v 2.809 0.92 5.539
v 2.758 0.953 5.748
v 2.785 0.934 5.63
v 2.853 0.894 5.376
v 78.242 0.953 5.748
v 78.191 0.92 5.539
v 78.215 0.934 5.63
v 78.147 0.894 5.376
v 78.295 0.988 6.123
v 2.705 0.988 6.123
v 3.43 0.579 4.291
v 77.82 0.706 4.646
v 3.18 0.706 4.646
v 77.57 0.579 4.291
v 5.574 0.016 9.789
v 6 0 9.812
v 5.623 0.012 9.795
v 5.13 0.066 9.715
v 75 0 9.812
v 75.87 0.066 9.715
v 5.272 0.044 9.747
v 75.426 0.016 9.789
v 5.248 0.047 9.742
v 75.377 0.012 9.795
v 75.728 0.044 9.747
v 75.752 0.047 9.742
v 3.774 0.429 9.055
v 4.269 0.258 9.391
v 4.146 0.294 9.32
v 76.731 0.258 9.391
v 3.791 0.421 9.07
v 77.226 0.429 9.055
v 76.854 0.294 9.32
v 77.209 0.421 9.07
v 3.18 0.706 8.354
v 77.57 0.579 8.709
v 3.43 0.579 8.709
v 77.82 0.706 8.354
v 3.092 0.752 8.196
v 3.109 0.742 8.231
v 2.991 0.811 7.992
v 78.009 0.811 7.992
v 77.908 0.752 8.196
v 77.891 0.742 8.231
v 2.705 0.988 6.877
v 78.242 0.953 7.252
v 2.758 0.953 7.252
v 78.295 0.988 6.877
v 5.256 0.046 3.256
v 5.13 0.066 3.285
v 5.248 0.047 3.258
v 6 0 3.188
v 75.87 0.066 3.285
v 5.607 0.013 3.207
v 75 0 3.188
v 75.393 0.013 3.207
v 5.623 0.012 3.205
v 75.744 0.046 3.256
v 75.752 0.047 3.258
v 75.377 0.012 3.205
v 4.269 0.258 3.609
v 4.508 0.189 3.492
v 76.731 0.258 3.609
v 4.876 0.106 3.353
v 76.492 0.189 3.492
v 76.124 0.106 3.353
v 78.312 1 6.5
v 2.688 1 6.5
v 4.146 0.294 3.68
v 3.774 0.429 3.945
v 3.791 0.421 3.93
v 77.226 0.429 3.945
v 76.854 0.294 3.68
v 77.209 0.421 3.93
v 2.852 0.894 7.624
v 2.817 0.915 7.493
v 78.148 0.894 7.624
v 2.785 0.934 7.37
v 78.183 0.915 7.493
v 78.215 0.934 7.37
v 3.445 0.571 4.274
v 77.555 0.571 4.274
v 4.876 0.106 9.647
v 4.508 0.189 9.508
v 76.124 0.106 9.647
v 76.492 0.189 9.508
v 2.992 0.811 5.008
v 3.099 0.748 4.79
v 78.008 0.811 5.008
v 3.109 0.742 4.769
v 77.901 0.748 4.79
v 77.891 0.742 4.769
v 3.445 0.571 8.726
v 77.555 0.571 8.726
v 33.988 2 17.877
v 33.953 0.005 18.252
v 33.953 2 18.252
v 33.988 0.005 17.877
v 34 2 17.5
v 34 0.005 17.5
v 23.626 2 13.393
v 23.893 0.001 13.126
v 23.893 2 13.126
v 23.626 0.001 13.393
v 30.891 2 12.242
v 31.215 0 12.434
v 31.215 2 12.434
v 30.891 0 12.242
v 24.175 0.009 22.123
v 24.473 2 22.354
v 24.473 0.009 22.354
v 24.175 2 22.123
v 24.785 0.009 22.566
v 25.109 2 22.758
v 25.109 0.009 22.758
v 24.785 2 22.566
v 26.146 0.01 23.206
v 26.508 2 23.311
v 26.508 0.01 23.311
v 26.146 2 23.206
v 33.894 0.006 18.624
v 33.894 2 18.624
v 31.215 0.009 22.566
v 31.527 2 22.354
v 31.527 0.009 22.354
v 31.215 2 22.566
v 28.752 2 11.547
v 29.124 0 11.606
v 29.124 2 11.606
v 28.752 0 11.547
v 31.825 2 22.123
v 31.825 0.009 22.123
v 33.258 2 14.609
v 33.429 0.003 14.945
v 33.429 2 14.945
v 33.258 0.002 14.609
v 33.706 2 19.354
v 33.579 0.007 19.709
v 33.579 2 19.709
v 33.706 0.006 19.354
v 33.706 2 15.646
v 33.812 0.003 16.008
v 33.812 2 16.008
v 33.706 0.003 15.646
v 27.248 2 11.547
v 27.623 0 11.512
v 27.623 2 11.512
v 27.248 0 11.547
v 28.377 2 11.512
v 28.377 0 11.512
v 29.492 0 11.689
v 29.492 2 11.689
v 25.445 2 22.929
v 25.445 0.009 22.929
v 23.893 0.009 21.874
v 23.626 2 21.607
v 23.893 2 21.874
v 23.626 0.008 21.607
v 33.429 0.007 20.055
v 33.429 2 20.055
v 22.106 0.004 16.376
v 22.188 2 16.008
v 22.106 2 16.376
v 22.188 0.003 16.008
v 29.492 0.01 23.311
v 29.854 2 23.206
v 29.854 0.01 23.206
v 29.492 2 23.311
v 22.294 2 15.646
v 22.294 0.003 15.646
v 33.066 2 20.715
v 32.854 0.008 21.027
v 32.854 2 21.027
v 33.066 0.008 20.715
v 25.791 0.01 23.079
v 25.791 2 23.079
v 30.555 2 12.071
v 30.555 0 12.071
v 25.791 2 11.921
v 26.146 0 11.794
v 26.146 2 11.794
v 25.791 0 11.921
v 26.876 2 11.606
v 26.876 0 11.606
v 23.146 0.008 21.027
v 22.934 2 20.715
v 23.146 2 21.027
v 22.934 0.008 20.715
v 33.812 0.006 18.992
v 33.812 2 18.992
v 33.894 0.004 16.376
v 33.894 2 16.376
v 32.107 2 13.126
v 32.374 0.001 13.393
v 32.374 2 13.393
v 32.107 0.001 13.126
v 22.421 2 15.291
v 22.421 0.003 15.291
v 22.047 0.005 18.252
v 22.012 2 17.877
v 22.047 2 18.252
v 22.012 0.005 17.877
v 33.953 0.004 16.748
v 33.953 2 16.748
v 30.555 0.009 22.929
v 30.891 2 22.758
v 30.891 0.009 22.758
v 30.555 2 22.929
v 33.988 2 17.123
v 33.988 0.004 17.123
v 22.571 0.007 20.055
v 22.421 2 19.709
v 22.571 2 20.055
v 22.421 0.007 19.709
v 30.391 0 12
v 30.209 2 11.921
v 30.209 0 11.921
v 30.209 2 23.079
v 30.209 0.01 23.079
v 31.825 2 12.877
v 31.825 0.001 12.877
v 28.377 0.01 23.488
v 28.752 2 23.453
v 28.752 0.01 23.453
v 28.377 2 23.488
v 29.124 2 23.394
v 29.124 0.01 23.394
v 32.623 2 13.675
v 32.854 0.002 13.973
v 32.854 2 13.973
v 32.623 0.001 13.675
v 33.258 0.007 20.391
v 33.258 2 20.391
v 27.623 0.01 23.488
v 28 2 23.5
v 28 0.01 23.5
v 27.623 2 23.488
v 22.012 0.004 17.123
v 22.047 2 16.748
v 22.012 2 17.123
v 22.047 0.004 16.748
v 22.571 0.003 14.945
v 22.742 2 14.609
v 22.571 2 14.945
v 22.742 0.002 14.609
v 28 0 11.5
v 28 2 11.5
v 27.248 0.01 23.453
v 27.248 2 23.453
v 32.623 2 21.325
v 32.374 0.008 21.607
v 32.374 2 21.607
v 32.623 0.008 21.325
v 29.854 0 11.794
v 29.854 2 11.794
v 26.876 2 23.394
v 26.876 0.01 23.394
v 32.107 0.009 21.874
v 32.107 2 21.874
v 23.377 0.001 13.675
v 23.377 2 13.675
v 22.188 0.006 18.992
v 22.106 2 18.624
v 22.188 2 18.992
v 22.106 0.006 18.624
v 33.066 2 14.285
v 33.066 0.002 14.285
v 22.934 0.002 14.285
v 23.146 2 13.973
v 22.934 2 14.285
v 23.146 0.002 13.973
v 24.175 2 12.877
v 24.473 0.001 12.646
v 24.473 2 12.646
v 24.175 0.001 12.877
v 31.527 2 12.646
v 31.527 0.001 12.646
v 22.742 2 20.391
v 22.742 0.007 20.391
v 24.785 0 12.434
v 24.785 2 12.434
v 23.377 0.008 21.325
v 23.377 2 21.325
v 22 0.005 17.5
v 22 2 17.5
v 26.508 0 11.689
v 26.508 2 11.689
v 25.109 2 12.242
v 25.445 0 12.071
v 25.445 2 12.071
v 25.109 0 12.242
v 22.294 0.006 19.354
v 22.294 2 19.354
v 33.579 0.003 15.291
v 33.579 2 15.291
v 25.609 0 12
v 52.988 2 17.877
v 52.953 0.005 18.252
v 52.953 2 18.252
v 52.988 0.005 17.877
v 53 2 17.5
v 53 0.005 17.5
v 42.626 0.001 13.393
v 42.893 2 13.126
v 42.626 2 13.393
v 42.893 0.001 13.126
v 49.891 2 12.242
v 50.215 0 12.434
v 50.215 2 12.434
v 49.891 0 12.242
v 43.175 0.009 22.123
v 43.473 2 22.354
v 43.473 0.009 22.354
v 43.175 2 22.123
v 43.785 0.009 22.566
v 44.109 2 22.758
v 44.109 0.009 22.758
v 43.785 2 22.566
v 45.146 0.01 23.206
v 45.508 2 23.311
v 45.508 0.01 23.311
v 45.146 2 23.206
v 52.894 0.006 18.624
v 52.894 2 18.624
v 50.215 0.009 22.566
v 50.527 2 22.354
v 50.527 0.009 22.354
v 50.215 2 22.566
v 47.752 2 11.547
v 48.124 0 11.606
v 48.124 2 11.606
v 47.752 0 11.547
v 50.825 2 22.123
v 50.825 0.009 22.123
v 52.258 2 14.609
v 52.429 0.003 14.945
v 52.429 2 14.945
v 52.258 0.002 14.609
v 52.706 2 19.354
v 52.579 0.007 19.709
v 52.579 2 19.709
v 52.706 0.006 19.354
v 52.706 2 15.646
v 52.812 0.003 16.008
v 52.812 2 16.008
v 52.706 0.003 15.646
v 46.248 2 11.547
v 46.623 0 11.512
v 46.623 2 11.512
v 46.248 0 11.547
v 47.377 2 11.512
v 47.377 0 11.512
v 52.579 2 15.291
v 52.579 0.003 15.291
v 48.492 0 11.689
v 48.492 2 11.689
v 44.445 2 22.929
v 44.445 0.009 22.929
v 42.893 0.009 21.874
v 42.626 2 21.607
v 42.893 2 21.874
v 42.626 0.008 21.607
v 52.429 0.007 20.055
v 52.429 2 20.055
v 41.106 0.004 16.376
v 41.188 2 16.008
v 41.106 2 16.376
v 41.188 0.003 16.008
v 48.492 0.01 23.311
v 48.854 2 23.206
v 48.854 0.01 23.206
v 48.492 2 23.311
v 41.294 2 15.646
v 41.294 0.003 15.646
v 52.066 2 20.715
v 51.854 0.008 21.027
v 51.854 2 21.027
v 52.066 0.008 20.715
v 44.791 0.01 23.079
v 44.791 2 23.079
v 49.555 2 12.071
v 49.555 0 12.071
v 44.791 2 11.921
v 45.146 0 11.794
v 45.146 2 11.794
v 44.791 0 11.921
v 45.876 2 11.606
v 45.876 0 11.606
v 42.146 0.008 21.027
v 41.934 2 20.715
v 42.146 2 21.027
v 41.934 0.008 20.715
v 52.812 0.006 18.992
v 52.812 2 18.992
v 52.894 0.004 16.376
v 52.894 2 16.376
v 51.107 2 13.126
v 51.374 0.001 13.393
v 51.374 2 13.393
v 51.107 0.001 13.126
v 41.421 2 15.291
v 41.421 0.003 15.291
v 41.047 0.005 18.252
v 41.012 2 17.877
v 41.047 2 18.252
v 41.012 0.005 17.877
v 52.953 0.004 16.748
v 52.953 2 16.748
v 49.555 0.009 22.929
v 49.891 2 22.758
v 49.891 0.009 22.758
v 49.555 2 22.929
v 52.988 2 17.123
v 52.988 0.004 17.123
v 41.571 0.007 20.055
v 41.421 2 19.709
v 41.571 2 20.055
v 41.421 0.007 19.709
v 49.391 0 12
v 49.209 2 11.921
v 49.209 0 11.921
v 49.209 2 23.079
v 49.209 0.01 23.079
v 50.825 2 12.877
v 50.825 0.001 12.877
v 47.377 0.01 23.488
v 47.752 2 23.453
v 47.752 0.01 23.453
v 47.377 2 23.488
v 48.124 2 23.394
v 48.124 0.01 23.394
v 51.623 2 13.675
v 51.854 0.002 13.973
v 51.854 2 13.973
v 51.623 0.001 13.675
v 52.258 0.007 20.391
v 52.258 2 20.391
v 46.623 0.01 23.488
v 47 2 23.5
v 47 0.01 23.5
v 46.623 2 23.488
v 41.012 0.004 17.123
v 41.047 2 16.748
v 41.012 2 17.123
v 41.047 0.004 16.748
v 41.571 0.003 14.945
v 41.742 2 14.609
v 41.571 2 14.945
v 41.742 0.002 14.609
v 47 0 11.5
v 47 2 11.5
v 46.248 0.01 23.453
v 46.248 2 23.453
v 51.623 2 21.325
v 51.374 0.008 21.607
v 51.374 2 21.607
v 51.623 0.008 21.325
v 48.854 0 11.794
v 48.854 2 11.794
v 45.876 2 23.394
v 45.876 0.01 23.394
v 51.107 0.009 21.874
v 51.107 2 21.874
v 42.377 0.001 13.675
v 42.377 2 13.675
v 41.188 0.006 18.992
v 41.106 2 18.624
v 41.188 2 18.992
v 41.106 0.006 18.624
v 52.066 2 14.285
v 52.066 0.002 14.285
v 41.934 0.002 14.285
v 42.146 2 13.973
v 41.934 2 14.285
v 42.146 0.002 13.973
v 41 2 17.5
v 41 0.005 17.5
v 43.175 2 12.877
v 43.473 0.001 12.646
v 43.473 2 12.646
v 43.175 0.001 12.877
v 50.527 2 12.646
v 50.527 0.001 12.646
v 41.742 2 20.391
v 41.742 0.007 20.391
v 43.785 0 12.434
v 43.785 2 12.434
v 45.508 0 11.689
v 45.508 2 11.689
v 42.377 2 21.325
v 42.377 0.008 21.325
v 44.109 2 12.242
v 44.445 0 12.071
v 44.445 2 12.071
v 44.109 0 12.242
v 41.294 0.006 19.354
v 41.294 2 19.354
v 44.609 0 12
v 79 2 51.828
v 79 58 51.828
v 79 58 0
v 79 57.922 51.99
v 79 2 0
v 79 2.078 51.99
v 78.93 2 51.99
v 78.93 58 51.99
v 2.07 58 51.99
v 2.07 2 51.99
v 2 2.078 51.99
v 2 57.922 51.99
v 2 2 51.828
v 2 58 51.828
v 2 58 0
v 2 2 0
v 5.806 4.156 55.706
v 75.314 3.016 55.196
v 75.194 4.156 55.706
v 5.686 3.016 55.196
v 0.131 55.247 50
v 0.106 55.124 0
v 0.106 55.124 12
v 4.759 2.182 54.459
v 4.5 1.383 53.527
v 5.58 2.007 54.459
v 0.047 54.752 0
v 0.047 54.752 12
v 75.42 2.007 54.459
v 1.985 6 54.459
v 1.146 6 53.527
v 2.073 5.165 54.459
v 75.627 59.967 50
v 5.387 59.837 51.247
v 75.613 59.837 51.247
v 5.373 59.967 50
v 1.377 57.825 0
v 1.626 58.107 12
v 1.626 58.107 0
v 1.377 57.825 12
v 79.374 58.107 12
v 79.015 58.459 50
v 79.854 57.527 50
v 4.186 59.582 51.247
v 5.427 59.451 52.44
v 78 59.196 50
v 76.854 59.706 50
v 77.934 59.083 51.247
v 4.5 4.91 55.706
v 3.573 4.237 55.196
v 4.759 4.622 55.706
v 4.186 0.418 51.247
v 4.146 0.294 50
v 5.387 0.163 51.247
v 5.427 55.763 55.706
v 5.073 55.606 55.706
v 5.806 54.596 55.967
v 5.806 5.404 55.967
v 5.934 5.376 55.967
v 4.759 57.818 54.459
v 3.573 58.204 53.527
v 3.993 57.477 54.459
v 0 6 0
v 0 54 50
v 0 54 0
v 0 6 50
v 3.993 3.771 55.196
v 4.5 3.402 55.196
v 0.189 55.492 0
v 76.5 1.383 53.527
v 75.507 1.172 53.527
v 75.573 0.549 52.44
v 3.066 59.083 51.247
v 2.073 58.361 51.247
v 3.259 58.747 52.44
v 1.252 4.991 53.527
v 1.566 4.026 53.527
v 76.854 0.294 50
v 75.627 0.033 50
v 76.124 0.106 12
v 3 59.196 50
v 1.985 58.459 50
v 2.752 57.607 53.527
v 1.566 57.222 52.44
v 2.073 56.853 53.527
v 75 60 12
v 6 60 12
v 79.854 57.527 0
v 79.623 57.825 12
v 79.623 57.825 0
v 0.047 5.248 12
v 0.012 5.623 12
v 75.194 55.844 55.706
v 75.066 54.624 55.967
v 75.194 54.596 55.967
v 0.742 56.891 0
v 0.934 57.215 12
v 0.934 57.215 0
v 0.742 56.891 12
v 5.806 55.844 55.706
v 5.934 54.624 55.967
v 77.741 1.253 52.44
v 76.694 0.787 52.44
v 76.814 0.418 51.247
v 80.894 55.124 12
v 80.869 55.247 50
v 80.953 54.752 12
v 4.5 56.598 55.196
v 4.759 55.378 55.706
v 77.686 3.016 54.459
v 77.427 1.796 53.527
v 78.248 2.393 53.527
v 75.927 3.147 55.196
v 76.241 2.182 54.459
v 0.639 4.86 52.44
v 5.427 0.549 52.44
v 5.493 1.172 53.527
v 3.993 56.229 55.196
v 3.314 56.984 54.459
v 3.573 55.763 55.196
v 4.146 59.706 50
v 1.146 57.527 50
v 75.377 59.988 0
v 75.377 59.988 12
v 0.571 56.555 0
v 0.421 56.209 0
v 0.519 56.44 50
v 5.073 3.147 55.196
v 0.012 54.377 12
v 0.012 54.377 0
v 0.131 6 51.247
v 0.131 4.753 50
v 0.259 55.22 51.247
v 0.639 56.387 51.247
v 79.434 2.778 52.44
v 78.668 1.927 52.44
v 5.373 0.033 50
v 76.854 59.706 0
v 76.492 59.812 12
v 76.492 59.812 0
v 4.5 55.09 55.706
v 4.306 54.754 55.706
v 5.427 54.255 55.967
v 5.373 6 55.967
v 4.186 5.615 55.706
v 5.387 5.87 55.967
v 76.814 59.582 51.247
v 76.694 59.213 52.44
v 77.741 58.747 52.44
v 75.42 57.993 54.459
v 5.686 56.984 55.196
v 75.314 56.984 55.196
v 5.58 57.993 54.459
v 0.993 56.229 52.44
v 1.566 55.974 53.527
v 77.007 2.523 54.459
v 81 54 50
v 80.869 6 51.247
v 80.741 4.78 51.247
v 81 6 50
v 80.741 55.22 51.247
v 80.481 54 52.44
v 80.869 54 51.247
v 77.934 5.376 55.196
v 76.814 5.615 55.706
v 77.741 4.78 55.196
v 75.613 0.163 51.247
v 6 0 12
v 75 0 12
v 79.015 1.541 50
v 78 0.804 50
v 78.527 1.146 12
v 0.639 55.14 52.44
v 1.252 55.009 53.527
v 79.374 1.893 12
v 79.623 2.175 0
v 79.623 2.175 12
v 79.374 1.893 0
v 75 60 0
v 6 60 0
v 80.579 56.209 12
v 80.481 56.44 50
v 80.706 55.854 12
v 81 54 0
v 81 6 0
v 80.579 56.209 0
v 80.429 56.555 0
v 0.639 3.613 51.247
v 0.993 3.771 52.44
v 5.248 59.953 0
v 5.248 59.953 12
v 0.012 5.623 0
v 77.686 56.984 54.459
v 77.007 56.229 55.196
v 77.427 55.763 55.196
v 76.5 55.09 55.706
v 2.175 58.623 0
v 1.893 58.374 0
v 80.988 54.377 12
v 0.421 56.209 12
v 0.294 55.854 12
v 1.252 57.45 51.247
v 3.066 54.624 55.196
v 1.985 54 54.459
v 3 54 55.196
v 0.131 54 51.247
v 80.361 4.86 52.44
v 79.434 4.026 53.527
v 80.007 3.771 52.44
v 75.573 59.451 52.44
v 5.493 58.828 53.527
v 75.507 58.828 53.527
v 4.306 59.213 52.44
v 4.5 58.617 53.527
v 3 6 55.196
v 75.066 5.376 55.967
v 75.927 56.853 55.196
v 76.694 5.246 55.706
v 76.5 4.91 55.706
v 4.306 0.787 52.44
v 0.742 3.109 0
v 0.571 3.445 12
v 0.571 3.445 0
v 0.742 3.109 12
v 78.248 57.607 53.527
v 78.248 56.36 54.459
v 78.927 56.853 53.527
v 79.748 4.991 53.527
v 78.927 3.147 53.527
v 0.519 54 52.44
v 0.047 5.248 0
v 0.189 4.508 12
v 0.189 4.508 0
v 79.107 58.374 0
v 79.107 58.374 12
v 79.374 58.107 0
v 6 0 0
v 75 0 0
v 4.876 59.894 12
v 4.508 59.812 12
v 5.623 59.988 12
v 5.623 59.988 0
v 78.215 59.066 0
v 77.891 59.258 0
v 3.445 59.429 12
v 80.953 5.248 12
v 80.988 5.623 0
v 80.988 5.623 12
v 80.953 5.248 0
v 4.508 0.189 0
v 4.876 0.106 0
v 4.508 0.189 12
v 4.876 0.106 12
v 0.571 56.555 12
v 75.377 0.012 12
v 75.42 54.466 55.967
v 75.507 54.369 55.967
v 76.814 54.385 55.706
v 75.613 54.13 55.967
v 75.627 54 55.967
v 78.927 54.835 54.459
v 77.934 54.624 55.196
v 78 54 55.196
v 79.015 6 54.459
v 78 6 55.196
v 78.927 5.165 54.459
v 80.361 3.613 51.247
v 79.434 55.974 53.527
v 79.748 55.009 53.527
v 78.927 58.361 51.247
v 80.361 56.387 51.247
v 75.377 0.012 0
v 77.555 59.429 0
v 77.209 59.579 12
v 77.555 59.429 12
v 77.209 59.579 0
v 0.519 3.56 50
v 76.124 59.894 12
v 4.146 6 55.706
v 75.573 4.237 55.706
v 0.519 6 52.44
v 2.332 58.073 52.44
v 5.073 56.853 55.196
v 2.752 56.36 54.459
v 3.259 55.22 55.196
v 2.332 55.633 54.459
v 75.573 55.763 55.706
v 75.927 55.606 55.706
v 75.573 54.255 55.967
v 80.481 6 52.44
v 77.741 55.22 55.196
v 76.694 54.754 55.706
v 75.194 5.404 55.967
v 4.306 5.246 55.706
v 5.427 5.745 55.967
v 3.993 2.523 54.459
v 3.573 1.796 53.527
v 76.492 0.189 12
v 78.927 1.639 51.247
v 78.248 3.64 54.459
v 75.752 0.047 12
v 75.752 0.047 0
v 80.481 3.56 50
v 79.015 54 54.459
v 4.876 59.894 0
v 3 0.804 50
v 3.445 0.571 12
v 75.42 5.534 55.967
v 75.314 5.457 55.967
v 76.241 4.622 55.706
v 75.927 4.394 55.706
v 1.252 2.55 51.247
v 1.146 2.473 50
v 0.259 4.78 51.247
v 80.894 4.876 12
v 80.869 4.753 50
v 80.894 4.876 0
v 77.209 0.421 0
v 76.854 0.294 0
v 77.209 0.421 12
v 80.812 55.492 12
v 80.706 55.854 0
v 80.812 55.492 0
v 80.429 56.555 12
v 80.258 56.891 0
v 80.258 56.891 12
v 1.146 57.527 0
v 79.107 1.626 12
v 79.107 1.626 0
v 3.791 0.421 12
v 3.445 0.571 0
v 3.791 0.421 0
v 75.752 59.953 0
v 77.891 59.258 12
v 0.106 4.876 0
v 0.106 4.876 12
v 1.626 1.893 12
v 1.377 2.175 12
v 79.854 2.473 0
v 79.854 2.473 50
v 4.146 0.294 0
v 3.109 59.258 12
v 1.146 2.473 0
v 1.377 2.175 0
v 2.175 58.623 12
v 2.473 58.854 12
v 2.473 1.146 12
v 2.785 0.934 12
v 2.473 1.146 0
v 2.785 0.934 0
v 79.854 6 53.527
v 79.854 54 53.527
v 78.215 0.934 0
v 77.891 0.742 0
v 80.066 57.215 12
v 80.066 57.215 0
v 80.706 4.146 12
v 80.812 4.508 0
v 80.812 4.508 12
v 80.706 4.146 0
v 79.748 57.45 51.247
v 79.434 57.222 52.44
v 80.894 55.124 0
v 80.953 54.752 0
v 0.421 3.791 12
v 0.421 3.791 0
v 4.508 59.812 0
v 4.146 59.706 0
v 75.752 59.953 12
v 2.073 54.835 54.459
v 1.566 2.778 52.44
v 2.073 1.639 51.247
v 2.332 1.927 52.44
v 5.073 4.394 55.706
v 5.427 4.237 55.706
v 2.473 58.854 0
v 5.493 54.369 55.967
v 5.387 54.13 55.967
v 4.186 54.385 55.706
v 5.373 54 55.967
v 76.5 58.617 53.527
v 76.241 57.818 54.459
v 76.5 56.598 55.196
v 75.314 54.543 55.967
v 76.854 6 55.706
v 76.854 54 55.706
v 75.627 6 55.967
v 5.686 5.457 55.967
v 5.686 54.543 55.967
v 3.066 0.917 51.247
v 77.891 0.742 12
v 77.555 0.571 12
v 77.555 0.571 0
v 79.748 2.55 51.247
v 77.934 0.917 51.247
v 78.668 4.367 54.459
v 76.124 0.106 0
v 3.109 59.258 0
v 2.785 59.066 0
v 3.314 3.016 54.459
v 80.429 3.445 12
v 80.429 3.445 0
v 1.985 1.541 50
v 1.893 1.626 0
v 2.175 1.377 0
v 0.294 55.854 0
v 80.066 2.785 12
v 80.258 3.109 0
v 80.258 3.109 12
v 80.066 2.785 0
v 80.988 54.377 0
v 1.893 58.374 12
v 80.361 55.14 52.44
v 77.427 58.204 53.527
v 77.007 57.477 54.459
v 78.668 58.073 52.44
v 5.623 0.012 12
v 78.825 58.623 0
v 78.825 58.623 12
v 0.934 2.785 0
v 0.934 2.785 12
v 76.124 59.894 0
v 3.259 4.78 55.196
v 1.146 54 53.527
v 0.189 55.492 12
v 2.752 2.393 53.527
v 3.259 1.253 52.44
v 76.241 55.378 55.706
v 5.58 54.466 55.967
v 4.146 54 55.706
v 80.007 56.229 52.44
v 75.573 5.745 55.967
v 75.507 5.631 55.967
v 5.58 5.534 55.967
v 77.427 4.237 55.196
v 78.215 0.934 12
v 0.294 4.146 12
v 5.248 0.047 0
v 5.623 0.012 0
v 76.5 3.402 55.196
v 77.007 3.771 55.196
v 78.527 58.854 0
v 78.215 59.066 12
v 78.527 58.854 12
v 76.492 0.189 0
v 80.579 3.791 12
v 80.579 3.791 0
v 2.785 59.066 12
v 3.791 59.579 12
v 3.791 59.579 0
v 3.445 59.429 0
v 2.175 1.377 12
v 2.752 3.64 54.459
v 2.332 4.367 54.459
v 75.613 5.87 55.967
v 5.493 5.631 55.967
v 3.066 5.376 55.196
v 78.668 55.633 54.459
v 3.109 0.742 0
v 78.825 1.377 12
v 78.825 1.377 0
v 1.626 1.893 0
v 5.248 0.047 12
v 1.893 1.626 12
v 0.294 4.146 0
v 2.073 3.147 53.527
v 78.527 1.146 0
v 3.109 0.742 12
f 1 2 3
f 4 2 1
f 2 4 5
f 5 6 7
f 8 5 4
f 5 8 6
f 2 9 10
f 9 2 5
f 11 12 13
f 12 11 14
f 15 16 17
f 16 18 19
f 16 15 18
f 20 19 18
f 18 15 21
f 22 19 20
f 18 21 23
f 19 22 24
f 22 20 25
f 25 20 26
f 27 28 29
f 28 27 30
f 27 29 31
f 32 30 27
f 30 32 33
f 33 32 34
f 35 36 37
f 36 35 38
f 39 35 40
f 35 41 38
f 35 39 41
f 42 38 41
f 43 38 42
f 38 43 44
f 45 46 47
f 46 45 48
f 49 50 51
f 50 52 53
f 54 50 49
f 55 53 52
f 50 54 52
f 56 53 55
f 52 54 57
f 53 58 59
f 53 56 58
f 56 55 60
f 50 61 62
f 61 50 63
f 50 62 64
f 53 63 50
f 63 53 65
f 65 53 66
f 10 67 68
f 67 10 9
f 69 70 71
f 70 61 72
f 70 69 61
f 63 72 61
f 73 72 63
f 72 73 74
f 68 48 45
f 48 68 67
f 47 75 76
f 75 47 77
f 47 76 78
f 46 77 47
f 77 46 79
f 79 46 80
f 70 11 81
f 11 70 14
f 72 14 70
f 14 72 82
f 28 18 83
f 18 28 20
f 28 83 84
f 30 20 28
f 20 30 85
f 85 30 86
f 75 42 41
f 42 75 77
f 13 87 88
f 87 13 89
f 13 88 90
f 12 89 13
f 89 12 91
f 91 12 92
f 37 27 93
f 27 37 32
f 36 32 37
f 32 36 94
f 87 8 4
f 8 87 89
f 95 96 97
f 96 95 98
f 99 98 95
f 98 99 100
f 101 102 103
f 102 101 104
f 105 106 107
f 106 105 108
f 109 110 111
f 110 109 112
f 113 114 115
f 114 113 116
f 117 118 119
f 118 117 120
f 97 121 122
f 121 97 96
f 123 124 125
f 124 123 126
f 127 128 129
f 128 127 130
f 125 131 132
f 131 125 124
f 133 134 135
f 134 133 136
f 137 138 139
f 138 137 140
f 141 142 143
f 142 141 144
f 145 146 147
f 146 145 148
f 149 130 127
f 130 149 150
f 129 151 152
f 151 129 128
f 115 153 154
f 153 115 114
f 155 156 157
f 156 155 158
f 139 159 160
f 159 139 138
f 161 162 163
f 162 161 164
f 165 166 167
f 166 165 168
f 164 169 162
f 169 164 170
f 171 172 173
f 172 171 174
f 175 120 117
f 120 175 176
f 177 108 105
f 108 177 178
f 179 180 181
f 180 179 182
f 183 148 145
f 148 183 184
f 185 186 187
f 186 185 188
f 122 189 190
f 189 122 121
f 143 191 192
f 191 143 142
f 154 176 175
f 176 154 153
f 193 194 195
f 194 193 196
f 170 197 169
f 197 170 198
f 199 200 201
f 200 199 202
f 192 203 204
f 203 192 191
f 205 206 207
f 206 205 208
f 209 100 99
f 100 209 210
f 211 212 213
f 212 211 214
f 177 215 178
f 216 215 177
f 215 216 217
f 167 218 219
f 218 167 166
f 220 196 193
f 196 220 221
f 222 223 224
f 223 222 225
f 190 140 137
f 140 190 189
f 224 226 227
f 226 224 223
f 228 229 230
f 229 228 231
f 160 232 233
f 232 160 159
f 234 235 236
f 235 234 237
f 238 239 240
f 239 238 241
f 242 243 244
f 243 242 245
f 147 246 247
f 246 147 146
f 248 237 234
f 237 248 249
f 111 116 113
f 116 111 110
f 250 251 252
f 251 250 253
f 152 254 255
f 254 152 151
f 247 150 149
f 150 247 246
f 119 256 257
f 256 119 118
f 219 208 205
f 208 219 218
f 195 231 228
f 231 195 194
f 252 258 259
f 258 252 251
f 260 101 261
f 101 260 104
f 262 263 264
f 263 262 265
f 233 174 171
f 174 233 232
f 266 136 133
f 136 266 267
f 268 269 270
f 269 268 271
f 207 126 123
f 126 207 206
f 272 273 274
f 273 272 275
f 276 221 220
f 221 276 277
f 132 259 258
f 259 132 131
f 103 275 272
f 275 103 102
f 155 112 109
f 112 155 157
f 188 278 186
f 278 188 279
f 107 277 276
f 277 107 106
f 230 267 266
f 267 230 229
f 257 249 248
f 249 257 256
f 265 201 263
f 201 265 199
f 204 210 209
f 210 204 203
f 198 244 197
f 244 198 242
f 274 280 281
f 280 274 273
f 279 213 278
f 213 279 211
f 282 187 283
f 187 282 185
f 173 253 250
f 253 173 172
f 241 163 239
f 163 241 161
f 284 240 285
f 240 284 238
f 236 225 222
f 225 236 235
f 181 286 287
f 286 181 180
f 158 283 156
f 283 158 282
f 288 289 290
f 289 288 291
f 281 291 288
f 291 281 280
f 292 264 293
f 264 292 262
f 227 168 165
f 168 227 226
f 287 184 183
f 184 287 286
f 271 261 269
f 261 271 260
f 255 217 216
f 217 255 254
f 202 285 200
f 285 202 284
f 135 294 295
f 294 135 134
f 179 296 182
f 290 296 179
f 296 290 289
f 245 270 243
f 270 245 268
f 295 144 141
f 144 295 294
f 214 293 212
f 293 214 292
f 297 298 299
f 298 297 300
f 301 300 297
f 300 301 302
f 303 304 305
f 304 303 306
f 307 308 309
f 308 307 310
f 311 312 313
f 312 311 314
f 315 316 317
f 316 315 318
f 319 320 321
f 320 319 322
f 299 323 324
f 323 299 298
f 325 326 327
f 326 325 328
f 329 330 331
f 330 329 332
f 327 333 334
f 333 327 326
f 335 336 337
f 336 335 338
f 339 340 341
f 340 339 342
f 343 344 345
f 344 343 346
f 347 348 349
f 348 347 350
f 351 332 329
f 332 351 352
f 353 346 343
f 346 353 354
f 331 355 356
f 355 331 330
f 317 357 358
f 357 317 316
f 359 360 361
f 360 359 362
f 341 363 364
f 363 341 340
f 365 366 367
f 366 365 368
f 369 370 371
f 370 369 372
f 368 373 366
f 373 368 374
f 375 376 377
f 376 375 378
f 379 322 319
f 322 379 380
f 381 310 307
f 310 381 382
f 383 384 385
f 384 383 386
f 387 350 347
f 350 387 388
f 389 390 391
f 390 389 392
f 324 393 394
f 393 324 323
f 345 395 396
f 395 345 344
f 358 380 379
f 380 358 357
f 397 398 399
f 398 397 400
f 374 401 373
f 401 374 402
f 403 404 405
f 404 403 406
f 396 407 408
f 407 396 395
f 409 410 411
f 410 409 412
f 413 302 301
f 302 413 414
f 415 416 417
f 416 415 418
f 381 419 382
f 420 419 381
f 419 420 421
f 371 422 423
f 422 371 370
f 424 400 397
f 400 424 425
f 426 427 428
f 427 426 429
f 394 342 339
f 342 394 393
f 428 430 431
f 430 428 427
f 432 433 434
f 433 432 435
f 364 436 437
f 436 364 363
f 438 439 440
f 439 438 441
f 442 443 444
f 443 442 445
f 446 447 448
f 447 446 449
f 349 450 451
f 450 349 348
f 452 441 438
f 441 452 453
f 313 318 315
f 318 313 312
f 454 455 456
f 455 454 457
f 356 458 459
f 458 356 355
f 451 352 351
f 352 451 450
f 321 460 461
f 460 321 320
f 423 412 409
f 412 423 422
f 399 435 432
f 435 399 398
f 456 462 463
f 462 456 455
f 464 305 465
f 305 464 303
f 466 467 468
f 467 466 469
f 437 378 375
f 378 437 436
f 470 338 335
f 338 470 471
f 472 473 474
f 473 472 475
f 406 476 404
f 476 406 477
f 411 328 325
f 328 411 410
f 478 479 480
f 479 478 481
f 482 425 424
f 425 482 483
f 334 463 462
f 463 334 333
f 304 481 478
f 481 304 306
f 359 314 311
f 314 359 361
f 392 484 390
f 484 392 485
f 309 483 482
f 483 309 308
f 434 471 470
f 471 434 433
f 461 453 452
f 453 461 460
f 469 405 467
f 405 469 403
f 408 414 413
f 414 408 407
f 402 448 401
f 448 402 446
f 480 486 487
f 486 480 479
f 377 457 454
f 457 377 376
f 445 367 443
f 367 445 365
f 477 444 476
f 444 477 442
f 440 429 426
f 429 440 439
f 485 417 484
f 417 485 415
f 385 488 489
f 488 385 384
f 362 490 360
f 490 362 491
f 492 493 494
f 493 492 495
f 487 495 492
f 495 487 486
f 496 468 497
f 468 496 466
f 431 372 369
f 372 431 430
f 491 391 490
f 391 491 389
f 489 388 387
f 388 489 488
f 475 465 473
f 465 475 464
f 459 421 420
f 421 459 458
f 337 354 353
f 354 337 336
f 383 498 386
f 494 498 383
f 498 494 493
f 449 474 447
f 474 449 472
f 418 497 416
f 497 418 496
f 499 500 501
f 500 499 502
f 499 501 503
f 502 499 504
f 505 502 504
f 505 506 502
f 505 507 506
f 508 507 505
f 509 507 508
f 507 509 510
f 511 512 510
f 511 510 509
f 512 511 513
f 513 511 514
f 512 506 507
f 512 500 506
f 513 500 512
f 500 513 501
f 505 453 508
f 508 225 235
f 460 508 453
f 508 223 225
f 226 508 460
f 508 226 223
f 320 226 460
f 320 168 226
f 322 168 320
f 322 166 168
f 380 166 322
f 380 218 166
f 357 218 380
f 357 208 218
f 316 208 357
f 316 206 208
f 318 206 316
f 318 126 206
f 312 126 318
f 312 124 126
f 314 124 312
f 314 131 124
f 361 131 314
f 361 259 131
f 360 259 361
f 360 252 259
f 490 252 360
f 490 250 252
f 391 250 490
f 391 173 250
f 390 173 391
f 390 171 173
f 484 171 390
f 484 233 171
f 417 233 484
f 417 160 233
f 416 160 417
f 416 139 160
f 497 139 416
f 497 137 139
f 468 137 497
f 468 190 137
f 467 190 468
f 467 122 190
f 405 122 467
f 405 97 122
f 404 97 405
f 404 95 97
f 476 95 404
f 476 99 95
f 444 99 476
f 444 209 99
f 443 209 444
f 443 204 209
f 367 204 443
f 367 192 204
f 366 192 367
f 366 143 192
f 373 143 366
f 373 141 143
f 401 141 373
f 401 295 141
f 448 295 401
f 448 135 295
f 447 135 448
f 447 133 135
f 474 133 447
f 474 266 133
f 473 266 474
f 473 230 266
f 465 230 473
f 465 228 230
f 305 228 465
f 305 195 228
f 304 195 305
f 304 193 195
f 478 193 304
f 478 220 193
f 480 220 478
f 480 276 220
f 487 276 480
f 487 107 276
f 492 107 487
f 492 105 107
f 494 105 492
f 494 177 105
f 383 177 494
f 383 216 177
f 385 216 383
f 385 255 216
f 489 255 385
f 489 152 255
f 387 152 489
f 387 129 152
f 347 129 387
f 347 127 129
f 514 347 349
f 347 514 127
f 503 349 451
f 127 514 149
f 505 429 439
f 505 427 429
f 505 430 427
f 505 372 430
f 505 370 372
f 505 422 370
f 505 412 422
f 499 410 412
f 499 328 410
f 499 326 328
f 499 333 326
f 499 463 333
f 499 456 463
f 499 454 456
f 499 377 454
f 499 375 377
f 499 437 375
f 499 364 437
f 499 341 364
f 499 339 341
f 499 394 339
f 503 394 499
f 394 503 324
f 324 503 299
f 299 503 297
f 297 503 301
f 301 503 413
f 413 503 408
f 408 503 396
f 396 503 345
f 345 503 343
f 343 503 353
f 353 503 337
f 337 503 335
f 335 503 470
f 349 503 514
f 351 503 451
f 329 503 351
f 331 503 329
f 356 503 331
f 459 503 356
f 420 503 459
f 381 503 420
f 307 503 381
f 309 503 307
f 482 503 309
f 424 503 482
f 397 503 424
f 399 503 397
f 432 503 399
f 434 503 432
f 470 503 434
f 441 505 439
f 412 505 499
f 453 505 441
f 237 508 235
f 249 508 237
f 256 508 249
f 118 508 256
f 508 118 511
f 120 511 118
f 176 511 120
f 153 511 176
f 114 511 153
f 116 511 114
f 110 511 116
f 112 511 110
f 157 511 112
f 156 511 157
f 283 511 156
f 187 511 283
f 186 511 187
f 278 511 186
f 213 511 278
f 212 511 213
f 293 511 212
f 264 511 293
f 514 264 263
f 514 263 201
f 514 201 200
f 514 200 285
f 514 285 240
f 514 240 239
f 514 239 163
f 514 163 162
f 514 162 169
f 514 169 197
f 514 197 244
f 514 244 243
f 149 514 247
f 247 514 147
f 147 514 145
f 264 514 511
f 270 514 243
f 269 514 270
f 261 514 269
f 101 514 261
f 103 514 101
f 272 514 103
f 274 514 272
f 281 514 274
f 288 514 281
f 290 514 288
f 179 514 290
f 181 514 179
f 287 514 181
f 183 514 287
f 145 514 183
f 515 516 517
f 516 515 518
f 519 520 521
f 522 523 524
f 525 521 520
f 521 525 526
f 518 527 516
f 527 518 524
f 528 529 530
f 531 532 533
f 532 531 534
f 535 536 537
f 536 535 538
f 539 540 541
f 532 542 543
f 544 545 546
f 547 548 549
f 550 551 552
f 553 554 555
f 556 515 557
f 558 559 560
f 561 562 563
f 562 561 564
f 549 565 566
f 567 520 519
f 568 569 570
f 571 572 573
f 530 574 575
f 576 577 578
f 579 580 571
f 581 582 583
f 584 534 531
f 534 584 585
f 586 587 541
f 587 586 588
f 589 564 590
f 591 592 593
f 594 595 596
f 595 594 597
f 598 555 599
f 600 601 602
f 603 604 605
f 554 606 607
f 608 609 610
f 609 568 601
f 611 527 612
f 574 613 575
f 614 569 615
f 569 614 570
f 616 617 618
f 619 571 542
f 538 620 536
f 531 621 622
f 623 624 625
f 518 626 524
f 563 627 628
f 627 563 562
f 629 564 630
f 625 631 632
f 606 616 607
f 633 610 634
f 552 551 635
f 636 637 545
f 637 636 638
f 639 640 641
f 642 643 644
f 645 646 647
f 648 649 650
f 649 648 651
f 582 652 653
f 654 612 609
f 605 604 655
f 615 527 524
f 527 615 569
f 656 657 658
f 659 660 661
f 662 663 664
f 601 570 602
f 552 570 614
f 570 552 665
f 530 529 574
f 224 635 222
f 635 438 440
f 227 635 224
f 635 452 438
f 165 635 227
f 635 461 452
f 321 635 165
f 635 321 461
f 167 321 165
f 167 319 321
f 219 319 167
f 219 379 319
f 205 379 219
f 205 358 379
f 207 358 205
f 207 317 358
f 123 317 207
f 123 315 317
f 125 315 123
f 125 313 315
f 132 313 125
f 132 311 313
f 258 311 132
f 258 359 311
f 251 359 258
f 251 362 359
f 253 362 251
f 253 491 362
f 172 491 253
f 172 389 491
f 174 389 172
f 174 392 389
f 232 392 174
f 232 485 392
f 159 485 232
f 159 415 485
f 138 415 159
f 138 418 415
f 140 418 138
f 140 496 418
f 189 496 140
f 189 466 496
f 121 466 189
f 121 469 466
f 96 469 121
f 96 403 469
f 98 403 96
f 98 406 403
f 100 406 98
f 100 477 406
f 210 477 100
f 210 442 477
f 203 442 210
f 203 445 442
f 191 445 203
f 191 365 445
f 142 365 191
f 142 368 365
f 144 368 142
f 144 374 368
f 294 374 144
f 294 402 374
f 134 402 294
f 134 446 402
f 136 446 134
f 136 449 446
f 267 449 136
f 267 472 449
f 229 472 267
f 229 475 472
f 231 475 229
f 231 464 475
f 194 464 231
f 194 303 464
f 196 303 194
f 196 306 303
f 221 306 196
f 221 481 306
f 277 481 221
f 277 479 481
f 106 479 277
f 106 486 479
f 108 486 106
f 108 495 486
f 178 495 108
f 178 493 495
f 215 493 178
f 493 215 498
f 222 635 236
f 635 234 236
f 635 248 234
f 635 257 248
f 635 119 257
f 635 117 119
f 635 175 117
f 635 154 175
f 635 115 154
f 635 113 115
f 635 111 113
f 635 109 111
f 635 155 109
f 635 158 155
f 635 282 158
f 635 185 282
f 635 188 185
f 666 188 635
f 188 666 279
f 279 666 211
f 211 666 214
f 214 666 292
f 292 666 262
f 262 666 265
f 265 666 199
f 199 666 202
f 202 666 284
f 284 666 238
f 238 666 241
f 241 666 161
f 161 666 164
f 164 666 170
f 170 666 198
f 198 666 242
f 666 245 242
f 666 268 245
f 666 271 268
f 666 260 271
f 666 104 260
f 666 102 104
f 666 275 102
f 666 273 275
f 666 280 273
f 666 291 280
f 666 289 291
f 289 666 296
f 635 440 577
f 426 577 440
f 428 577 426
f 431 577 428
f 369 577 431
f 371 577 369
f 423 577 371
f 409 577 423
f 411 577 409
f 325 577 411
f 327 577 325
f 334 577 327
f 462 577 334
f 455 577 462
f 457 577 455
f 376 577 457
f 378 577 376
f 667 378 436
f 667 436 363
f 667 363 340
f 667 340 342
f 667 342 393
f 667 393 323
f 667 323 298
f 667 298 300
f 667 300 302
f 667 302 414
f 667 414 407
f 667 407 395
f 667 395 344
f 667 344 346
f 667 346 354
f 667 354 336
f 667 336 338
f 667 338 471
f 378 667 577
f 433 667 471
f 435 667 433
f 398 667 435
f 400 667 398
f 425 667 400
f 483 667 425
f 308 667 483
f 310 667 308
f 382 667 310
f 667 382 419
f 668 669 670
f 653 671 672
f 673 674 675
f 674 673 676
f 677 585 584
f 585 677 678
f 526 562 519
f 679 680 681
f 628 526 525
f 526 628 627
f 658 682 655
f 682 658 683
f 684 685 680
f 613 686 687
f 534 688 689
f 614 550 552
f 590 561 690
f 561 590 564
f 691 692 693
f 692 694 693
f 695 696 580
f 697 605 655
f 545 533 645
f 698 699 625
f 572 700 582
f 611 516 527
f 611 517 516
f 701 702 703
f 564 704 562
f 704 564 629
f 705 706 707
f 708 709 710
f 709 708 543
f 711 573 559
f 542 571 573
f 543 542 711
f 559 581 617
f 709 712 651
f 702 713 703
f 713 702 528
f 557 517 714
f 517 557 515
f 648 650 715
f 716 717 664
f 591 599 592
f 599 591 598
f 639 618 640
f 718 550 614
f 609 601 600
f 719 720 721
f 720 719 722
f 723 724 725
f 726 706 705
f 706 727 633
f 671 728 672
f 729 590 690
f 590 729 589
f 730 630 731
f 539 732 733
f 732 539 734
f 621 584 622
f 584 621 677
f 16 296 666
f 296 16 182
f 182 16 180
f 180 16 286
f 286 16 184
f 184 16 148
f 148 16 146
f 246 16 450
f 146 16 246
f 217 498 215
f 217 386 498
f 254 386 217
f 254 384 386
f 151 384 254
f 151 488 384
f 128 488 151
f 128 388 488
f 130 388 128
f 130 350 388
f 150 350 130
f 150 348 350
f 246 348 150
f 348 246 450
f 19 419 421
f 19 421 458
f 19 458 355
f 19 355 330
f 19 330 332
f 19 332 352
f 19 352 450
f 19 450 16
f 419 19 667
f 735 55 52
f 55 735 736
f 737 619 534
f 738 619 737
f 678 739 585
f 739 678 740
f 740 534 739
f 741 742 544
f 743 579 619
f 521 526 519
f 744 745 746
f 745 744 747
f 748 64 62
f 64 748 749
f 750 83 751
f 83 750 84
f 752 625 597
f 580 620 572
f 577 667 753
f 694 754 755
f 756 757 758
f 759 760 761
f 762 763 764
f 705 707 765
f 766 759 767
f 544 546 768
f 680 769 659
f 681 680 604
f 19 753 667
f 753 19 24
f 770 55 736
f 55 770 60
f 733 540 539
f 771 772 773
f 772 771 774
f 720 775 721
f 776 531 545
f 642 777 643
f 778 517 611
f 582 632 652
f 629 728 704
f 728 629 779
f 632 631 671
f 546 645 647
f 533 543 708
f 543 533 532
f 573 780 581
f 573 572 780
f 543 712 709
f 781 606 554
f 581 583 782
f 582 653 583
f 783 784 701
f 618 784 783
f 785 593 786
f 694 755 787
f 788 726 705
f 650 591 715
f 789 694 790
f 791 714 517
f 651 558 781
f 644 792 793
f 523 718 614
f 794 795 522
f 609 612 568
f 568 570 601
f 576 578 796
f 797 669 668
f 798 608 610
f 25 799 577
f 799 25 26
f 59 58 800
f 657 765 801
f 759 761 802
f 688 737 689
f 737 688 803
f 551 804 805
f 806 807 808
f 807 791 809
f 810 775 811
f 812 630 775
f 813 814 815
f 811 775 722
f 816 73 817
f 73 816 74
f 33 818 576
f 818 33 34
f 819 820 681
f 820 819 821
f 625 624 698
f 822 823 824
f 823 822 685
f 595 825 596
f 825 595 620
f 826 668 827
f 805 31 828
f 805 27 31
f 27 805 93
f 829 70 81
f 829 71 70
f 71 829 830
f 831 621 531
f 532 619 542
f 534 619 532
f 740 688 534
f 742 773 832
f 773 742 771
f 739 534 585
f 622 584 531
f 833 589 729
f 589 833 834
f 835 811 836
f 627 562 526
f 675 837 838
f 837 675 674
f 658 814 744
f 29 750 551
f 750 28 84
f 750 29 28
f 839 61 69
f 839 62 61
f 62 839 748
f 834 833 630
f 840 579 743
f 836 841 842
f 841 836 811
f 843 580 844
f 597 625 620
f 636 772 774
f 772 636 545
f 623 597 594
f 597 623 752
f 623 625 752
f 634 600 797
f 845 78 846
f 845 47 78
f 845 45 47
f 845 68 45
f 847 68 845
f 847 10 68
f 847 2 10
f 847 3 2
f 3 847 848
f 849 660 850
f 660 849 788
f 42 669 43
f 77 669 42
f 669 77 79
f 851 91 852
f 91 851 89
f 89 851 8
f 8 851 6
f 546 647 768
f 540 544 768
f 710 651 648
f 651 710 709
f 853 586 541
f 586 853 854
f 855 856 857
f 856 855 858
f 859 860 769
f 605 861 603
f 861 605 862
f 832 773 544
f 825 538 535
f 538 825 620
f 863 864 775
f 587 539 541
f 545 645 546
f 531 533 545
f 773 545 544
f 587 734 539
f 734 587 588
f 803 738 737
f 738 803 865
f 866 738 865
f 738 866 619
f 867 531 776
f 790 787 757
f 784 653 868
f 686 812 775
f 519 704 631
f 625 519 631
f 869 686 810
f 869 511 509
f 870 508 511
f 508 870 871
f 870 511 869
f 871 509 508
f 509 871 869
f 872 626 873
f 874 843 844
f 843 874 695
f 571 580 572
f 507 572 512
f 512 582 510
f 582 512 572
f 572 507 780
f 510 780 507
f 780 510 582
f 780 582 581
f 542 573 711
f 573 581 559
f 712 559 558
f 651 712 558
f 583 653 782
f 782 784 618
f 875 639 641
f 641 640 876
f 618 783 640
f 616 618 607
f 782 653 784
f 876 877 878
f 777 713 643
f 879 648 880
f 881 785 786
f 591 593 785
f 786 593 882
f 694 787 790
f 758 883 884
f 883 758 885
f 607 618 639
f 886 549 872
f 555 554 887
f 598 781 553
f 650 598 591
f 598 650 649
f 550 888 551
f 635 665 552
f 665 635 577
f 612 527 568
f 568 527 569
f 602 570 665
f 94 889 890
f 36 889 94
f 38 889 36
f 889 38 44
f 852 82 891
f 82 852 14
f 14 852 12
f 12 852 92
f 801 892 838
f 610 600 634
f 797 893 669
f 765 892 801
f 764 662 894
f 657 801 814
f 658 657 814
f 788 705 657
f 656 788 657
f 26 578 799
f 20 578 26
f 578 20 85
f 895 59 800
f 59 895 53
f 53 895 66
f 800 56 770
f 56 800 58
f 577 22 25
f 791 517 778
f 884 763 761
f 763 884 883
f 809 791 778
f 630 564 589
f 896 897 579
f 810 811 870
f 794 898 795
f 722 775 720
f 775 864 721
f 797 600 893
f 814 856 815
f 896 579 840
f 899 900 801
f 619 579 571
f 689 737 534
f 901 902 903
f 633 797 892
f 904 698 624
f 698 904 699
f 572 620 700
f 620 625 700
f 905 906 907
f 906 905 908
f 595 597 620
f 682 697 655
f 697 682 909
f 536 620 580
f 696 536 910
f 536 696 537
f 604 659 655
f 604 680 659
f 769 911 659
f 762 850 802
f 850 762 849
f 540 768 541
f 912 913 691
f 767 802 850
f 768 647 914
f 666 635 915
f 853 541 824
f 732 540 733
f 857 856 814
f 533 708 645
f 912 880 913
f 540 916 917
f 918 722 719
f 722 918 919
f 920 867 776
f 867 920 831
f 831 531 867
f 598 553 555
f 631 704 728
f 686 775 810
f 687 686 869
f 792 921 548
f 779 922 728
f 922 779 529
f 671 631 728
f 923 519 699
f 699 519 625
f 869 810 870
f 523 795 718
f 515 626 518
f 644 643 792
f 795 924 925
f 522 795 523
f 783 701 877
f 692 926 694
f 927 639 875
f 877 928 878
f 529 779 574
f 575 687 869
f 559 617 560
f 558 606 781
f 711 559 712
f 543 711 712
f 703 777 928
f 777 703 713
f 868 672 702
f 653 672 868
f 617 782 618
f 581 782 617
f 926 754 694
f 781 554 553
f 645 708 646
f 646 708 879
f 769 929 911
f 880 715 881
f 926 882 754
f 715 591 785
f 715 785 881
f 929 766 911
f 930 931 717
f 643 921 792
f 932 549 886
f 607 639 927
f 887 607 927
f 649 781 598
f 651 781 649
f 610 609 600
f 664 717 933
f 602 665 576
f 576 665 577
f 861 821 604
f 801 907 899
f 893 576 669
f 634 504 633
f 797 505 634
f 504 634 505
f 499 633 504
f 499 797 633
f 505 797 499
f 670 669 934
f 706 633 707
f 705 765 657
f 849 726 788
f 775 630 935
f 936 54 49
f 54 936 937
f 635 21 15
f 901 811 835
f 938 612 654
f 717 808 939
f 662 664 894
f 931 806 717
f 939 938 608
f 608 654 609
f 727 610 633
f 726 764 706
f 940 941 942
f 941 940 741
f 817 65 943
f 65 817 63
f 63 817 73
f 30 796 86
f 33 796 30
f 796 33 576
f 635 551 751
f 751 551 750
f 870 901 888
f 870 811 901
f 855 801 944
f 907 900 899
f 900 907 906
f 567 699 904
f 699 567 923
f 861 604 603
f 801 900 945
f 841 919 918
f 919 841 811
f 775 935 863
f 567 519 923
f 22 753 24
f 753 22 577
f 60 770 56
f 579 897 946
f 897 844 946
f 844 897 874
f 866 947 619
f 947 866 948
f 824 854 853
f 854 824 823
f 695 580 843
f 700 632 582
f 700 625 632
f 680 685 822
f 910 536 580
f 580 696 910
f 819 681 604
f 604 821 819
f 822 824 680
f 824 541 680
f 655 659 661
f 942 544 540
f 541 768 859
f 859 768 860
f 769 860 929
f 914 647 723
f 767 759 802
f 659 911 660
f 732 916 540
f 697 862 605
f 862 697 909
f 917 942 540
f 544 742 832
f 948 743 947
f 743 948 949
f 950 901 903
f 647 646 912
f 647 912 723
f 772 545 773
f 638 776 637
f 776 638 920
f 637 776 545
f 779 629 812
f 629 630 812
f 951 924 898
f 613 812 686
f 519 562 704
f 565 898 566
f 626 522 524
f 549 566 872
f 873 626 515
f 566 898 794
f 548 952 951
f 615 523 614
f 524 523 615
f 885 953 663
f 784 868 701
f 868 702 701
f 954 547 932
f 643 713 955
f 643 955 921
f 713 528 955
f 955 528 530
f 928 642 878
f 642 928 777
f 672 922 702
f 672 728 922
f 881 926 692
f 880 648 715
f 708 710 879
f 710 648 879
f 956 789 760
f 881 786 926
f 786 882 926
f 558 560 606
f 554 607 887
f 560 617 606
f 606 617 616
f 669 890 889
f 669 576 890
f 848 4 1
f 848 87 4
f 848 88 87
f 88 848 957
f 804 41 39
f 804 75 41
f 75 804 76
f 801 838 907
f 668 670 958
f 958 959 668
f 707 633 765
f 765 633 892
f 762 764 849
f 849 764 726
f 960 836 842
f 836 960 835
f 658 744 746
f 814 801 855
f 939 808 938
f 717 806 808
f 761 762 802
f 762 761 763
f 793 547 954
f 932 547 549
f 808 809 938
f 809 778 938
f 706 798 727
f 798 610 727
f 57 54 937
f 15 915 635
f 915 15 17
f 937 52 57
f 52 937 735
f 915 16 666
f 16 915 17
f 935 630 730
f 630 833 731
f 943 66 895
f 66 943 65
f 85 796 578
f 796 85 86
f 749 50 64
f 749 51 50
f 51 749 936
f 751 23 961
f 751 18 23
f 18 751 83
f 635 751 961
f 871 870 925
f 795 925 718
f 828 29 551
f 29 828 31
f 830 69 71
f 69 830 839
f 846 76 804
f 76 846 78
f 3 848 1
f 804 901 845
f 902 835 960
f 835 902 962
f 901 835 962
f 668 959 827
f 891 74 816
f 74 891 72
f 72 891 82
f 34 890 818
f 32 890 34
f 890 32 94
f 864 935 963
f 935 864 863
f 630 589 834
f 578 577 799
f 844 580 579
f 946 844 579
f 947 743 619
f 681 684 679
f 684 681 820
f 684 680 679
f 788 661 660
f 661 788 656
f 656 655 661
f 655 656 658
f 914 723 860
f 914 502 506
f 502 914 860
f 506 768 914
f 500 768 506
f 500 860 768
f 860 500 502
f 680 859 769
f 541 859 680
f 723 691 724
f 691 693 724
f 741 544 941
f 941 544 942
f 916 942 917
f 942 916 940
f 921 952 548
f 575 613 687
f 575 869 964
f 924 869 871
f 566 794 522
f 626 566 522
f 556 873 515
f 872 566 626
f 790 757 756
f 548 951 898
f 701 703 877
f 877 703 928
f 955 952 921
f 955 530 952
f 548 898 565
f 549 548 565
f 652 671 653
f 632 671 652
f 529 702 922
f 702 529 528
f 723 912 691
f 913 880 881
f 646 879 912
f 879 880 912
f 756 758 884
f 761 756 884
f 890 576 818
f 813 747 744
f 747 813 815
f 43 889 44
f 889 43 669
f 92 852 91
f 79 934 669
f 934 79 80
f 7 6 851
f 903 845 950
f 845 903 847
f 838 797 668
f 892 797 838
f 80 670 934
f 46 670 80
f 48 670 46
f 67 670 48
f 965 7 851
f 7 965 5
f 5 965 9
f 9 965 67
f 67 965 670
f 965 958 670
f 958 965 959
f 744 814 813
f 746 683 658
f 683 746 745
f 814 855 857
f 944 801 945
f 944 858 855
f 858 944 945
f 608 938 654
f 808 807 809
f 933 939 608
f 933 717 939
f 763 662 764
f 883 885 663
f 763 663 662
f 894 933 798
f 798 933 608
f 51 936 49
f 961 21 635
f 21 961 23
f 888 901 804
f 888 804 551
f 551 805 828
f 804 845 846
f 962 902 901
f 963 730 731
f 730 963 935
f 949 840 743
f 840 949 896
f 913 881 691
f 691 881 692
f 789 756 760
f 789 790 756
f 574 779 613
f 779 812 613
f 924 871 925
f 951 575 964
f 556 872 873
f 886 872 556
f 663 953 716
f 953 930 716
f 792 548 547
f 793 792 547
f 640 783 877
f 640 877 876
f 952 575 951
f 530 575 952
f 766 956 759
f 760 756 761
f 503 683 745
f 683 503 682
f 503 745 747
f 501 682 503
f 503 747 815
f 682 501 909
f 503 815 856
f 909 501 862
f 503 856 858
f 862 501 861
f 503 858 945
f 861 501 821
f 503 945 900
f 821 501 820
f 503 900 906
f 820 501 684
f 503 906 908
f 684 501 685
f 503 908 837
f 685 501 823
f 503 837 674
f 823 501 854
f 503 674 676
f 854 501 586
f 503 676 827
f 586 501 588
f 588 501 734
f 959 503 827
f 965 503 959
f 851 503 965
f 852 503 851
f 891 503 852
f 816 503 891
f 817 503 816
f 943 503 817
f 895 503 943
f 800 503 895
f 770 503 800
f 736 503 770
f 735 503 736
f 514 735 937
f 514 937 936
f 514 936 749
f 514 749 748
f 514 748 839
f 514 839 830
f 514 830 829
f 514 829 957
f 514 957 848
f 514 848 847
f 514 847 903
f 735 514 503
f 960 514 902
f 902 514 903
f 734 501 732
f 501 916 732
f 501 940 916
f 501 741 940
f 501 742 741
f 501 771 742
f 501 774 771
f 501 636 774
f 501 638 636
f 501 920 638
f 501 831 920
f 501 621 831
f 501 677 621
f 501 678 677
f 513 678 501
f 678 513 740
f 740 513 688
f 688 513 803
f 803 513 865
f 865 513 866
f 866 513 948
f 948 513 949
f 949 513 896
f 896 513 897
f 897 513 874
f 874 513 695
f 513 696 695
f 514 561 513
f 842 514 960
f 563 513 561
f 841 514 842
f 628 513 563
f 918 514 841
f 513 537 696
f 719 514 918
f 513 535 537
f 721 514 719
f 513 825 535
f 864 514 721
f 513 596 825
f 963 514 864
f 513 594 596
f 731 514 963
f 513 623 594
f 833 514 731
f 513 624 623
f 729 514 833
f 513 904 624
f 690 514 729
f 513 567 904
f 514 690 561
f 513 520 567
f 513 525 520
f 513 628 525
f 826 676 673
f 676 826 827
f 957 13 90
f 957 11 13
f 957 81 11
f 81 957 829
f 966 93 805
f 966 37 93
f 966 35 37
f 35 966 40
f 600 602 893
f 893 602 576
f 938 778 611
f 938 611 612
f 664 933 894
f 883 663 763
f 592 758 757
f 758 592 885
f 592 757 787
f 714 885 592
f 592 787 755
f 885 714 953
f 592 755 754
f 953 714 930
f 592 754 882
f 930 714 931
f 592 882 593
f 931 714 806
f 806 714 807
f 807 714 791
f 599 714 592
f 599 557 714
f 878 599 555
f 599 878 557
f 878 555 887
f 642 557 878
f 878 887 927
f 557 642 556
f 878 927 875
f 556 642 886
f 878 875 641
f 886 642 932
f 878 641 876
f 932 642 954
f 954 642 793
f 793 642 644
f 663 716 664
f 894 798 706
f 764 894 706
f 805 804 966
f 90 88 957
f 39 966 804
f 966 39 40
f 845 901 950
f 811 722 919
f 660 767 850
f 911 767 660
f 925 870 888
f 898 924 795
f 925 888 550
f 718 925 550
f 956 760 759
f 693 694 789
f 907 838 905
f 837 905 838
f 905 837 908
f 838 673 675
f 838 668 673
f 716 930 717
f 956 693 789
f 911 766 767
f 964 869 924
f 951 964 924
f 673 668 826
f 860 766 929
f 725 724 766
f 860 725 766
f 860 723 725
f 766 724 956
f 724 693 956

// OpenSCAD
difference(){
	union(){
        translate([0,0,0]){
            roundedcube([77+4, 56+4, 52+4], false, 6, "zmax");
        }



        
	}
	union() {

        translate([-2+3,-10+5,6.5]){
            rotate([0,90,0]){
                cylinder(h=280, r=6, $fn=100, center=false);
            }
        }        
        translate([-9.5+75/2,38-3,17.5]){
            rotate([90,0,0]){
                cylinder(h=200, r=6, $fn=100, center=false);
            }
        }
        translate([9.5+75/2,38-3,17.5]){
            rotate([90,0,0]){
                cylinder(h=250, r=6, $fn=100, center=false);
            }
        }     


        translate([2,2,-0.01]){
           cube([77,56,52], center=false);
        }

	}
}


$fs = 0.15;

module roundedcube(size = [1, 1, 1], center = false, radius = 0.5, apply_to = "all") {
	// If single value, convert to [x, y, z] vector
	size = (size[0] == undef) ? [size, size, size] : size;

	translate_min = radius;
	translate_xmax = size[0] - radius;
	translate_ymax = size[1] - radius;
	translate_zmax = size[2] - radius;

	diameter = radius * 2;

	obj_translate = (center == false) ?
		[0, 0, 0] : [
			-(size[0] / 2),
			-(size[1] / 2),
			-(size[2] / 2)
		];

	translate(v = obj_translate) {
		hull() {
			for (translate_x = [translate_min, translate_xmax]) {
				x_at = (translate_x == translate_min) ? "min" : "max";
				for (translate_y = [translate_min, translate_ymax]) {
					y_at = (translate_y == translate_min) ? "min" : "max";
					for (translate_z = [translate_min, translate_zmax]) {
						z_at = (translate_z == translate_min) ? "min" : "max";

						translate(v = [translate_x, translate_y, translate_z])
						if (
							(apply_to == "all") ||
							(apply_to == "xmin" && x_at == "min") || (apply_to == "xmax" && x_at == "max") ||
							(apply_to == "ymin" && y_at == "min") || (apply_to == "ymax" && y_at == "max") ||
							(apply_to == "zmin" && z_at == "min") || (apply_to == "zmax" && z_at == "max")
						) {
							sphere(r = radius);
						} else {
							rotate = 
								(apply_to == "xmin" || apply_to == "xmax" || apply_to == "x") ? [0, 90, 0] : (
								(apply_to == "ymin" || apply_to == "ymax" || apply_to == "y") ? [90, 90, 0] :
								[0, 0, 0]
							);
							rotate(a = rotate)
							cylinder(h = diameter, r = radius, center = true, $fn=100);
						}
					}
				}
			}
		}
	}
}
